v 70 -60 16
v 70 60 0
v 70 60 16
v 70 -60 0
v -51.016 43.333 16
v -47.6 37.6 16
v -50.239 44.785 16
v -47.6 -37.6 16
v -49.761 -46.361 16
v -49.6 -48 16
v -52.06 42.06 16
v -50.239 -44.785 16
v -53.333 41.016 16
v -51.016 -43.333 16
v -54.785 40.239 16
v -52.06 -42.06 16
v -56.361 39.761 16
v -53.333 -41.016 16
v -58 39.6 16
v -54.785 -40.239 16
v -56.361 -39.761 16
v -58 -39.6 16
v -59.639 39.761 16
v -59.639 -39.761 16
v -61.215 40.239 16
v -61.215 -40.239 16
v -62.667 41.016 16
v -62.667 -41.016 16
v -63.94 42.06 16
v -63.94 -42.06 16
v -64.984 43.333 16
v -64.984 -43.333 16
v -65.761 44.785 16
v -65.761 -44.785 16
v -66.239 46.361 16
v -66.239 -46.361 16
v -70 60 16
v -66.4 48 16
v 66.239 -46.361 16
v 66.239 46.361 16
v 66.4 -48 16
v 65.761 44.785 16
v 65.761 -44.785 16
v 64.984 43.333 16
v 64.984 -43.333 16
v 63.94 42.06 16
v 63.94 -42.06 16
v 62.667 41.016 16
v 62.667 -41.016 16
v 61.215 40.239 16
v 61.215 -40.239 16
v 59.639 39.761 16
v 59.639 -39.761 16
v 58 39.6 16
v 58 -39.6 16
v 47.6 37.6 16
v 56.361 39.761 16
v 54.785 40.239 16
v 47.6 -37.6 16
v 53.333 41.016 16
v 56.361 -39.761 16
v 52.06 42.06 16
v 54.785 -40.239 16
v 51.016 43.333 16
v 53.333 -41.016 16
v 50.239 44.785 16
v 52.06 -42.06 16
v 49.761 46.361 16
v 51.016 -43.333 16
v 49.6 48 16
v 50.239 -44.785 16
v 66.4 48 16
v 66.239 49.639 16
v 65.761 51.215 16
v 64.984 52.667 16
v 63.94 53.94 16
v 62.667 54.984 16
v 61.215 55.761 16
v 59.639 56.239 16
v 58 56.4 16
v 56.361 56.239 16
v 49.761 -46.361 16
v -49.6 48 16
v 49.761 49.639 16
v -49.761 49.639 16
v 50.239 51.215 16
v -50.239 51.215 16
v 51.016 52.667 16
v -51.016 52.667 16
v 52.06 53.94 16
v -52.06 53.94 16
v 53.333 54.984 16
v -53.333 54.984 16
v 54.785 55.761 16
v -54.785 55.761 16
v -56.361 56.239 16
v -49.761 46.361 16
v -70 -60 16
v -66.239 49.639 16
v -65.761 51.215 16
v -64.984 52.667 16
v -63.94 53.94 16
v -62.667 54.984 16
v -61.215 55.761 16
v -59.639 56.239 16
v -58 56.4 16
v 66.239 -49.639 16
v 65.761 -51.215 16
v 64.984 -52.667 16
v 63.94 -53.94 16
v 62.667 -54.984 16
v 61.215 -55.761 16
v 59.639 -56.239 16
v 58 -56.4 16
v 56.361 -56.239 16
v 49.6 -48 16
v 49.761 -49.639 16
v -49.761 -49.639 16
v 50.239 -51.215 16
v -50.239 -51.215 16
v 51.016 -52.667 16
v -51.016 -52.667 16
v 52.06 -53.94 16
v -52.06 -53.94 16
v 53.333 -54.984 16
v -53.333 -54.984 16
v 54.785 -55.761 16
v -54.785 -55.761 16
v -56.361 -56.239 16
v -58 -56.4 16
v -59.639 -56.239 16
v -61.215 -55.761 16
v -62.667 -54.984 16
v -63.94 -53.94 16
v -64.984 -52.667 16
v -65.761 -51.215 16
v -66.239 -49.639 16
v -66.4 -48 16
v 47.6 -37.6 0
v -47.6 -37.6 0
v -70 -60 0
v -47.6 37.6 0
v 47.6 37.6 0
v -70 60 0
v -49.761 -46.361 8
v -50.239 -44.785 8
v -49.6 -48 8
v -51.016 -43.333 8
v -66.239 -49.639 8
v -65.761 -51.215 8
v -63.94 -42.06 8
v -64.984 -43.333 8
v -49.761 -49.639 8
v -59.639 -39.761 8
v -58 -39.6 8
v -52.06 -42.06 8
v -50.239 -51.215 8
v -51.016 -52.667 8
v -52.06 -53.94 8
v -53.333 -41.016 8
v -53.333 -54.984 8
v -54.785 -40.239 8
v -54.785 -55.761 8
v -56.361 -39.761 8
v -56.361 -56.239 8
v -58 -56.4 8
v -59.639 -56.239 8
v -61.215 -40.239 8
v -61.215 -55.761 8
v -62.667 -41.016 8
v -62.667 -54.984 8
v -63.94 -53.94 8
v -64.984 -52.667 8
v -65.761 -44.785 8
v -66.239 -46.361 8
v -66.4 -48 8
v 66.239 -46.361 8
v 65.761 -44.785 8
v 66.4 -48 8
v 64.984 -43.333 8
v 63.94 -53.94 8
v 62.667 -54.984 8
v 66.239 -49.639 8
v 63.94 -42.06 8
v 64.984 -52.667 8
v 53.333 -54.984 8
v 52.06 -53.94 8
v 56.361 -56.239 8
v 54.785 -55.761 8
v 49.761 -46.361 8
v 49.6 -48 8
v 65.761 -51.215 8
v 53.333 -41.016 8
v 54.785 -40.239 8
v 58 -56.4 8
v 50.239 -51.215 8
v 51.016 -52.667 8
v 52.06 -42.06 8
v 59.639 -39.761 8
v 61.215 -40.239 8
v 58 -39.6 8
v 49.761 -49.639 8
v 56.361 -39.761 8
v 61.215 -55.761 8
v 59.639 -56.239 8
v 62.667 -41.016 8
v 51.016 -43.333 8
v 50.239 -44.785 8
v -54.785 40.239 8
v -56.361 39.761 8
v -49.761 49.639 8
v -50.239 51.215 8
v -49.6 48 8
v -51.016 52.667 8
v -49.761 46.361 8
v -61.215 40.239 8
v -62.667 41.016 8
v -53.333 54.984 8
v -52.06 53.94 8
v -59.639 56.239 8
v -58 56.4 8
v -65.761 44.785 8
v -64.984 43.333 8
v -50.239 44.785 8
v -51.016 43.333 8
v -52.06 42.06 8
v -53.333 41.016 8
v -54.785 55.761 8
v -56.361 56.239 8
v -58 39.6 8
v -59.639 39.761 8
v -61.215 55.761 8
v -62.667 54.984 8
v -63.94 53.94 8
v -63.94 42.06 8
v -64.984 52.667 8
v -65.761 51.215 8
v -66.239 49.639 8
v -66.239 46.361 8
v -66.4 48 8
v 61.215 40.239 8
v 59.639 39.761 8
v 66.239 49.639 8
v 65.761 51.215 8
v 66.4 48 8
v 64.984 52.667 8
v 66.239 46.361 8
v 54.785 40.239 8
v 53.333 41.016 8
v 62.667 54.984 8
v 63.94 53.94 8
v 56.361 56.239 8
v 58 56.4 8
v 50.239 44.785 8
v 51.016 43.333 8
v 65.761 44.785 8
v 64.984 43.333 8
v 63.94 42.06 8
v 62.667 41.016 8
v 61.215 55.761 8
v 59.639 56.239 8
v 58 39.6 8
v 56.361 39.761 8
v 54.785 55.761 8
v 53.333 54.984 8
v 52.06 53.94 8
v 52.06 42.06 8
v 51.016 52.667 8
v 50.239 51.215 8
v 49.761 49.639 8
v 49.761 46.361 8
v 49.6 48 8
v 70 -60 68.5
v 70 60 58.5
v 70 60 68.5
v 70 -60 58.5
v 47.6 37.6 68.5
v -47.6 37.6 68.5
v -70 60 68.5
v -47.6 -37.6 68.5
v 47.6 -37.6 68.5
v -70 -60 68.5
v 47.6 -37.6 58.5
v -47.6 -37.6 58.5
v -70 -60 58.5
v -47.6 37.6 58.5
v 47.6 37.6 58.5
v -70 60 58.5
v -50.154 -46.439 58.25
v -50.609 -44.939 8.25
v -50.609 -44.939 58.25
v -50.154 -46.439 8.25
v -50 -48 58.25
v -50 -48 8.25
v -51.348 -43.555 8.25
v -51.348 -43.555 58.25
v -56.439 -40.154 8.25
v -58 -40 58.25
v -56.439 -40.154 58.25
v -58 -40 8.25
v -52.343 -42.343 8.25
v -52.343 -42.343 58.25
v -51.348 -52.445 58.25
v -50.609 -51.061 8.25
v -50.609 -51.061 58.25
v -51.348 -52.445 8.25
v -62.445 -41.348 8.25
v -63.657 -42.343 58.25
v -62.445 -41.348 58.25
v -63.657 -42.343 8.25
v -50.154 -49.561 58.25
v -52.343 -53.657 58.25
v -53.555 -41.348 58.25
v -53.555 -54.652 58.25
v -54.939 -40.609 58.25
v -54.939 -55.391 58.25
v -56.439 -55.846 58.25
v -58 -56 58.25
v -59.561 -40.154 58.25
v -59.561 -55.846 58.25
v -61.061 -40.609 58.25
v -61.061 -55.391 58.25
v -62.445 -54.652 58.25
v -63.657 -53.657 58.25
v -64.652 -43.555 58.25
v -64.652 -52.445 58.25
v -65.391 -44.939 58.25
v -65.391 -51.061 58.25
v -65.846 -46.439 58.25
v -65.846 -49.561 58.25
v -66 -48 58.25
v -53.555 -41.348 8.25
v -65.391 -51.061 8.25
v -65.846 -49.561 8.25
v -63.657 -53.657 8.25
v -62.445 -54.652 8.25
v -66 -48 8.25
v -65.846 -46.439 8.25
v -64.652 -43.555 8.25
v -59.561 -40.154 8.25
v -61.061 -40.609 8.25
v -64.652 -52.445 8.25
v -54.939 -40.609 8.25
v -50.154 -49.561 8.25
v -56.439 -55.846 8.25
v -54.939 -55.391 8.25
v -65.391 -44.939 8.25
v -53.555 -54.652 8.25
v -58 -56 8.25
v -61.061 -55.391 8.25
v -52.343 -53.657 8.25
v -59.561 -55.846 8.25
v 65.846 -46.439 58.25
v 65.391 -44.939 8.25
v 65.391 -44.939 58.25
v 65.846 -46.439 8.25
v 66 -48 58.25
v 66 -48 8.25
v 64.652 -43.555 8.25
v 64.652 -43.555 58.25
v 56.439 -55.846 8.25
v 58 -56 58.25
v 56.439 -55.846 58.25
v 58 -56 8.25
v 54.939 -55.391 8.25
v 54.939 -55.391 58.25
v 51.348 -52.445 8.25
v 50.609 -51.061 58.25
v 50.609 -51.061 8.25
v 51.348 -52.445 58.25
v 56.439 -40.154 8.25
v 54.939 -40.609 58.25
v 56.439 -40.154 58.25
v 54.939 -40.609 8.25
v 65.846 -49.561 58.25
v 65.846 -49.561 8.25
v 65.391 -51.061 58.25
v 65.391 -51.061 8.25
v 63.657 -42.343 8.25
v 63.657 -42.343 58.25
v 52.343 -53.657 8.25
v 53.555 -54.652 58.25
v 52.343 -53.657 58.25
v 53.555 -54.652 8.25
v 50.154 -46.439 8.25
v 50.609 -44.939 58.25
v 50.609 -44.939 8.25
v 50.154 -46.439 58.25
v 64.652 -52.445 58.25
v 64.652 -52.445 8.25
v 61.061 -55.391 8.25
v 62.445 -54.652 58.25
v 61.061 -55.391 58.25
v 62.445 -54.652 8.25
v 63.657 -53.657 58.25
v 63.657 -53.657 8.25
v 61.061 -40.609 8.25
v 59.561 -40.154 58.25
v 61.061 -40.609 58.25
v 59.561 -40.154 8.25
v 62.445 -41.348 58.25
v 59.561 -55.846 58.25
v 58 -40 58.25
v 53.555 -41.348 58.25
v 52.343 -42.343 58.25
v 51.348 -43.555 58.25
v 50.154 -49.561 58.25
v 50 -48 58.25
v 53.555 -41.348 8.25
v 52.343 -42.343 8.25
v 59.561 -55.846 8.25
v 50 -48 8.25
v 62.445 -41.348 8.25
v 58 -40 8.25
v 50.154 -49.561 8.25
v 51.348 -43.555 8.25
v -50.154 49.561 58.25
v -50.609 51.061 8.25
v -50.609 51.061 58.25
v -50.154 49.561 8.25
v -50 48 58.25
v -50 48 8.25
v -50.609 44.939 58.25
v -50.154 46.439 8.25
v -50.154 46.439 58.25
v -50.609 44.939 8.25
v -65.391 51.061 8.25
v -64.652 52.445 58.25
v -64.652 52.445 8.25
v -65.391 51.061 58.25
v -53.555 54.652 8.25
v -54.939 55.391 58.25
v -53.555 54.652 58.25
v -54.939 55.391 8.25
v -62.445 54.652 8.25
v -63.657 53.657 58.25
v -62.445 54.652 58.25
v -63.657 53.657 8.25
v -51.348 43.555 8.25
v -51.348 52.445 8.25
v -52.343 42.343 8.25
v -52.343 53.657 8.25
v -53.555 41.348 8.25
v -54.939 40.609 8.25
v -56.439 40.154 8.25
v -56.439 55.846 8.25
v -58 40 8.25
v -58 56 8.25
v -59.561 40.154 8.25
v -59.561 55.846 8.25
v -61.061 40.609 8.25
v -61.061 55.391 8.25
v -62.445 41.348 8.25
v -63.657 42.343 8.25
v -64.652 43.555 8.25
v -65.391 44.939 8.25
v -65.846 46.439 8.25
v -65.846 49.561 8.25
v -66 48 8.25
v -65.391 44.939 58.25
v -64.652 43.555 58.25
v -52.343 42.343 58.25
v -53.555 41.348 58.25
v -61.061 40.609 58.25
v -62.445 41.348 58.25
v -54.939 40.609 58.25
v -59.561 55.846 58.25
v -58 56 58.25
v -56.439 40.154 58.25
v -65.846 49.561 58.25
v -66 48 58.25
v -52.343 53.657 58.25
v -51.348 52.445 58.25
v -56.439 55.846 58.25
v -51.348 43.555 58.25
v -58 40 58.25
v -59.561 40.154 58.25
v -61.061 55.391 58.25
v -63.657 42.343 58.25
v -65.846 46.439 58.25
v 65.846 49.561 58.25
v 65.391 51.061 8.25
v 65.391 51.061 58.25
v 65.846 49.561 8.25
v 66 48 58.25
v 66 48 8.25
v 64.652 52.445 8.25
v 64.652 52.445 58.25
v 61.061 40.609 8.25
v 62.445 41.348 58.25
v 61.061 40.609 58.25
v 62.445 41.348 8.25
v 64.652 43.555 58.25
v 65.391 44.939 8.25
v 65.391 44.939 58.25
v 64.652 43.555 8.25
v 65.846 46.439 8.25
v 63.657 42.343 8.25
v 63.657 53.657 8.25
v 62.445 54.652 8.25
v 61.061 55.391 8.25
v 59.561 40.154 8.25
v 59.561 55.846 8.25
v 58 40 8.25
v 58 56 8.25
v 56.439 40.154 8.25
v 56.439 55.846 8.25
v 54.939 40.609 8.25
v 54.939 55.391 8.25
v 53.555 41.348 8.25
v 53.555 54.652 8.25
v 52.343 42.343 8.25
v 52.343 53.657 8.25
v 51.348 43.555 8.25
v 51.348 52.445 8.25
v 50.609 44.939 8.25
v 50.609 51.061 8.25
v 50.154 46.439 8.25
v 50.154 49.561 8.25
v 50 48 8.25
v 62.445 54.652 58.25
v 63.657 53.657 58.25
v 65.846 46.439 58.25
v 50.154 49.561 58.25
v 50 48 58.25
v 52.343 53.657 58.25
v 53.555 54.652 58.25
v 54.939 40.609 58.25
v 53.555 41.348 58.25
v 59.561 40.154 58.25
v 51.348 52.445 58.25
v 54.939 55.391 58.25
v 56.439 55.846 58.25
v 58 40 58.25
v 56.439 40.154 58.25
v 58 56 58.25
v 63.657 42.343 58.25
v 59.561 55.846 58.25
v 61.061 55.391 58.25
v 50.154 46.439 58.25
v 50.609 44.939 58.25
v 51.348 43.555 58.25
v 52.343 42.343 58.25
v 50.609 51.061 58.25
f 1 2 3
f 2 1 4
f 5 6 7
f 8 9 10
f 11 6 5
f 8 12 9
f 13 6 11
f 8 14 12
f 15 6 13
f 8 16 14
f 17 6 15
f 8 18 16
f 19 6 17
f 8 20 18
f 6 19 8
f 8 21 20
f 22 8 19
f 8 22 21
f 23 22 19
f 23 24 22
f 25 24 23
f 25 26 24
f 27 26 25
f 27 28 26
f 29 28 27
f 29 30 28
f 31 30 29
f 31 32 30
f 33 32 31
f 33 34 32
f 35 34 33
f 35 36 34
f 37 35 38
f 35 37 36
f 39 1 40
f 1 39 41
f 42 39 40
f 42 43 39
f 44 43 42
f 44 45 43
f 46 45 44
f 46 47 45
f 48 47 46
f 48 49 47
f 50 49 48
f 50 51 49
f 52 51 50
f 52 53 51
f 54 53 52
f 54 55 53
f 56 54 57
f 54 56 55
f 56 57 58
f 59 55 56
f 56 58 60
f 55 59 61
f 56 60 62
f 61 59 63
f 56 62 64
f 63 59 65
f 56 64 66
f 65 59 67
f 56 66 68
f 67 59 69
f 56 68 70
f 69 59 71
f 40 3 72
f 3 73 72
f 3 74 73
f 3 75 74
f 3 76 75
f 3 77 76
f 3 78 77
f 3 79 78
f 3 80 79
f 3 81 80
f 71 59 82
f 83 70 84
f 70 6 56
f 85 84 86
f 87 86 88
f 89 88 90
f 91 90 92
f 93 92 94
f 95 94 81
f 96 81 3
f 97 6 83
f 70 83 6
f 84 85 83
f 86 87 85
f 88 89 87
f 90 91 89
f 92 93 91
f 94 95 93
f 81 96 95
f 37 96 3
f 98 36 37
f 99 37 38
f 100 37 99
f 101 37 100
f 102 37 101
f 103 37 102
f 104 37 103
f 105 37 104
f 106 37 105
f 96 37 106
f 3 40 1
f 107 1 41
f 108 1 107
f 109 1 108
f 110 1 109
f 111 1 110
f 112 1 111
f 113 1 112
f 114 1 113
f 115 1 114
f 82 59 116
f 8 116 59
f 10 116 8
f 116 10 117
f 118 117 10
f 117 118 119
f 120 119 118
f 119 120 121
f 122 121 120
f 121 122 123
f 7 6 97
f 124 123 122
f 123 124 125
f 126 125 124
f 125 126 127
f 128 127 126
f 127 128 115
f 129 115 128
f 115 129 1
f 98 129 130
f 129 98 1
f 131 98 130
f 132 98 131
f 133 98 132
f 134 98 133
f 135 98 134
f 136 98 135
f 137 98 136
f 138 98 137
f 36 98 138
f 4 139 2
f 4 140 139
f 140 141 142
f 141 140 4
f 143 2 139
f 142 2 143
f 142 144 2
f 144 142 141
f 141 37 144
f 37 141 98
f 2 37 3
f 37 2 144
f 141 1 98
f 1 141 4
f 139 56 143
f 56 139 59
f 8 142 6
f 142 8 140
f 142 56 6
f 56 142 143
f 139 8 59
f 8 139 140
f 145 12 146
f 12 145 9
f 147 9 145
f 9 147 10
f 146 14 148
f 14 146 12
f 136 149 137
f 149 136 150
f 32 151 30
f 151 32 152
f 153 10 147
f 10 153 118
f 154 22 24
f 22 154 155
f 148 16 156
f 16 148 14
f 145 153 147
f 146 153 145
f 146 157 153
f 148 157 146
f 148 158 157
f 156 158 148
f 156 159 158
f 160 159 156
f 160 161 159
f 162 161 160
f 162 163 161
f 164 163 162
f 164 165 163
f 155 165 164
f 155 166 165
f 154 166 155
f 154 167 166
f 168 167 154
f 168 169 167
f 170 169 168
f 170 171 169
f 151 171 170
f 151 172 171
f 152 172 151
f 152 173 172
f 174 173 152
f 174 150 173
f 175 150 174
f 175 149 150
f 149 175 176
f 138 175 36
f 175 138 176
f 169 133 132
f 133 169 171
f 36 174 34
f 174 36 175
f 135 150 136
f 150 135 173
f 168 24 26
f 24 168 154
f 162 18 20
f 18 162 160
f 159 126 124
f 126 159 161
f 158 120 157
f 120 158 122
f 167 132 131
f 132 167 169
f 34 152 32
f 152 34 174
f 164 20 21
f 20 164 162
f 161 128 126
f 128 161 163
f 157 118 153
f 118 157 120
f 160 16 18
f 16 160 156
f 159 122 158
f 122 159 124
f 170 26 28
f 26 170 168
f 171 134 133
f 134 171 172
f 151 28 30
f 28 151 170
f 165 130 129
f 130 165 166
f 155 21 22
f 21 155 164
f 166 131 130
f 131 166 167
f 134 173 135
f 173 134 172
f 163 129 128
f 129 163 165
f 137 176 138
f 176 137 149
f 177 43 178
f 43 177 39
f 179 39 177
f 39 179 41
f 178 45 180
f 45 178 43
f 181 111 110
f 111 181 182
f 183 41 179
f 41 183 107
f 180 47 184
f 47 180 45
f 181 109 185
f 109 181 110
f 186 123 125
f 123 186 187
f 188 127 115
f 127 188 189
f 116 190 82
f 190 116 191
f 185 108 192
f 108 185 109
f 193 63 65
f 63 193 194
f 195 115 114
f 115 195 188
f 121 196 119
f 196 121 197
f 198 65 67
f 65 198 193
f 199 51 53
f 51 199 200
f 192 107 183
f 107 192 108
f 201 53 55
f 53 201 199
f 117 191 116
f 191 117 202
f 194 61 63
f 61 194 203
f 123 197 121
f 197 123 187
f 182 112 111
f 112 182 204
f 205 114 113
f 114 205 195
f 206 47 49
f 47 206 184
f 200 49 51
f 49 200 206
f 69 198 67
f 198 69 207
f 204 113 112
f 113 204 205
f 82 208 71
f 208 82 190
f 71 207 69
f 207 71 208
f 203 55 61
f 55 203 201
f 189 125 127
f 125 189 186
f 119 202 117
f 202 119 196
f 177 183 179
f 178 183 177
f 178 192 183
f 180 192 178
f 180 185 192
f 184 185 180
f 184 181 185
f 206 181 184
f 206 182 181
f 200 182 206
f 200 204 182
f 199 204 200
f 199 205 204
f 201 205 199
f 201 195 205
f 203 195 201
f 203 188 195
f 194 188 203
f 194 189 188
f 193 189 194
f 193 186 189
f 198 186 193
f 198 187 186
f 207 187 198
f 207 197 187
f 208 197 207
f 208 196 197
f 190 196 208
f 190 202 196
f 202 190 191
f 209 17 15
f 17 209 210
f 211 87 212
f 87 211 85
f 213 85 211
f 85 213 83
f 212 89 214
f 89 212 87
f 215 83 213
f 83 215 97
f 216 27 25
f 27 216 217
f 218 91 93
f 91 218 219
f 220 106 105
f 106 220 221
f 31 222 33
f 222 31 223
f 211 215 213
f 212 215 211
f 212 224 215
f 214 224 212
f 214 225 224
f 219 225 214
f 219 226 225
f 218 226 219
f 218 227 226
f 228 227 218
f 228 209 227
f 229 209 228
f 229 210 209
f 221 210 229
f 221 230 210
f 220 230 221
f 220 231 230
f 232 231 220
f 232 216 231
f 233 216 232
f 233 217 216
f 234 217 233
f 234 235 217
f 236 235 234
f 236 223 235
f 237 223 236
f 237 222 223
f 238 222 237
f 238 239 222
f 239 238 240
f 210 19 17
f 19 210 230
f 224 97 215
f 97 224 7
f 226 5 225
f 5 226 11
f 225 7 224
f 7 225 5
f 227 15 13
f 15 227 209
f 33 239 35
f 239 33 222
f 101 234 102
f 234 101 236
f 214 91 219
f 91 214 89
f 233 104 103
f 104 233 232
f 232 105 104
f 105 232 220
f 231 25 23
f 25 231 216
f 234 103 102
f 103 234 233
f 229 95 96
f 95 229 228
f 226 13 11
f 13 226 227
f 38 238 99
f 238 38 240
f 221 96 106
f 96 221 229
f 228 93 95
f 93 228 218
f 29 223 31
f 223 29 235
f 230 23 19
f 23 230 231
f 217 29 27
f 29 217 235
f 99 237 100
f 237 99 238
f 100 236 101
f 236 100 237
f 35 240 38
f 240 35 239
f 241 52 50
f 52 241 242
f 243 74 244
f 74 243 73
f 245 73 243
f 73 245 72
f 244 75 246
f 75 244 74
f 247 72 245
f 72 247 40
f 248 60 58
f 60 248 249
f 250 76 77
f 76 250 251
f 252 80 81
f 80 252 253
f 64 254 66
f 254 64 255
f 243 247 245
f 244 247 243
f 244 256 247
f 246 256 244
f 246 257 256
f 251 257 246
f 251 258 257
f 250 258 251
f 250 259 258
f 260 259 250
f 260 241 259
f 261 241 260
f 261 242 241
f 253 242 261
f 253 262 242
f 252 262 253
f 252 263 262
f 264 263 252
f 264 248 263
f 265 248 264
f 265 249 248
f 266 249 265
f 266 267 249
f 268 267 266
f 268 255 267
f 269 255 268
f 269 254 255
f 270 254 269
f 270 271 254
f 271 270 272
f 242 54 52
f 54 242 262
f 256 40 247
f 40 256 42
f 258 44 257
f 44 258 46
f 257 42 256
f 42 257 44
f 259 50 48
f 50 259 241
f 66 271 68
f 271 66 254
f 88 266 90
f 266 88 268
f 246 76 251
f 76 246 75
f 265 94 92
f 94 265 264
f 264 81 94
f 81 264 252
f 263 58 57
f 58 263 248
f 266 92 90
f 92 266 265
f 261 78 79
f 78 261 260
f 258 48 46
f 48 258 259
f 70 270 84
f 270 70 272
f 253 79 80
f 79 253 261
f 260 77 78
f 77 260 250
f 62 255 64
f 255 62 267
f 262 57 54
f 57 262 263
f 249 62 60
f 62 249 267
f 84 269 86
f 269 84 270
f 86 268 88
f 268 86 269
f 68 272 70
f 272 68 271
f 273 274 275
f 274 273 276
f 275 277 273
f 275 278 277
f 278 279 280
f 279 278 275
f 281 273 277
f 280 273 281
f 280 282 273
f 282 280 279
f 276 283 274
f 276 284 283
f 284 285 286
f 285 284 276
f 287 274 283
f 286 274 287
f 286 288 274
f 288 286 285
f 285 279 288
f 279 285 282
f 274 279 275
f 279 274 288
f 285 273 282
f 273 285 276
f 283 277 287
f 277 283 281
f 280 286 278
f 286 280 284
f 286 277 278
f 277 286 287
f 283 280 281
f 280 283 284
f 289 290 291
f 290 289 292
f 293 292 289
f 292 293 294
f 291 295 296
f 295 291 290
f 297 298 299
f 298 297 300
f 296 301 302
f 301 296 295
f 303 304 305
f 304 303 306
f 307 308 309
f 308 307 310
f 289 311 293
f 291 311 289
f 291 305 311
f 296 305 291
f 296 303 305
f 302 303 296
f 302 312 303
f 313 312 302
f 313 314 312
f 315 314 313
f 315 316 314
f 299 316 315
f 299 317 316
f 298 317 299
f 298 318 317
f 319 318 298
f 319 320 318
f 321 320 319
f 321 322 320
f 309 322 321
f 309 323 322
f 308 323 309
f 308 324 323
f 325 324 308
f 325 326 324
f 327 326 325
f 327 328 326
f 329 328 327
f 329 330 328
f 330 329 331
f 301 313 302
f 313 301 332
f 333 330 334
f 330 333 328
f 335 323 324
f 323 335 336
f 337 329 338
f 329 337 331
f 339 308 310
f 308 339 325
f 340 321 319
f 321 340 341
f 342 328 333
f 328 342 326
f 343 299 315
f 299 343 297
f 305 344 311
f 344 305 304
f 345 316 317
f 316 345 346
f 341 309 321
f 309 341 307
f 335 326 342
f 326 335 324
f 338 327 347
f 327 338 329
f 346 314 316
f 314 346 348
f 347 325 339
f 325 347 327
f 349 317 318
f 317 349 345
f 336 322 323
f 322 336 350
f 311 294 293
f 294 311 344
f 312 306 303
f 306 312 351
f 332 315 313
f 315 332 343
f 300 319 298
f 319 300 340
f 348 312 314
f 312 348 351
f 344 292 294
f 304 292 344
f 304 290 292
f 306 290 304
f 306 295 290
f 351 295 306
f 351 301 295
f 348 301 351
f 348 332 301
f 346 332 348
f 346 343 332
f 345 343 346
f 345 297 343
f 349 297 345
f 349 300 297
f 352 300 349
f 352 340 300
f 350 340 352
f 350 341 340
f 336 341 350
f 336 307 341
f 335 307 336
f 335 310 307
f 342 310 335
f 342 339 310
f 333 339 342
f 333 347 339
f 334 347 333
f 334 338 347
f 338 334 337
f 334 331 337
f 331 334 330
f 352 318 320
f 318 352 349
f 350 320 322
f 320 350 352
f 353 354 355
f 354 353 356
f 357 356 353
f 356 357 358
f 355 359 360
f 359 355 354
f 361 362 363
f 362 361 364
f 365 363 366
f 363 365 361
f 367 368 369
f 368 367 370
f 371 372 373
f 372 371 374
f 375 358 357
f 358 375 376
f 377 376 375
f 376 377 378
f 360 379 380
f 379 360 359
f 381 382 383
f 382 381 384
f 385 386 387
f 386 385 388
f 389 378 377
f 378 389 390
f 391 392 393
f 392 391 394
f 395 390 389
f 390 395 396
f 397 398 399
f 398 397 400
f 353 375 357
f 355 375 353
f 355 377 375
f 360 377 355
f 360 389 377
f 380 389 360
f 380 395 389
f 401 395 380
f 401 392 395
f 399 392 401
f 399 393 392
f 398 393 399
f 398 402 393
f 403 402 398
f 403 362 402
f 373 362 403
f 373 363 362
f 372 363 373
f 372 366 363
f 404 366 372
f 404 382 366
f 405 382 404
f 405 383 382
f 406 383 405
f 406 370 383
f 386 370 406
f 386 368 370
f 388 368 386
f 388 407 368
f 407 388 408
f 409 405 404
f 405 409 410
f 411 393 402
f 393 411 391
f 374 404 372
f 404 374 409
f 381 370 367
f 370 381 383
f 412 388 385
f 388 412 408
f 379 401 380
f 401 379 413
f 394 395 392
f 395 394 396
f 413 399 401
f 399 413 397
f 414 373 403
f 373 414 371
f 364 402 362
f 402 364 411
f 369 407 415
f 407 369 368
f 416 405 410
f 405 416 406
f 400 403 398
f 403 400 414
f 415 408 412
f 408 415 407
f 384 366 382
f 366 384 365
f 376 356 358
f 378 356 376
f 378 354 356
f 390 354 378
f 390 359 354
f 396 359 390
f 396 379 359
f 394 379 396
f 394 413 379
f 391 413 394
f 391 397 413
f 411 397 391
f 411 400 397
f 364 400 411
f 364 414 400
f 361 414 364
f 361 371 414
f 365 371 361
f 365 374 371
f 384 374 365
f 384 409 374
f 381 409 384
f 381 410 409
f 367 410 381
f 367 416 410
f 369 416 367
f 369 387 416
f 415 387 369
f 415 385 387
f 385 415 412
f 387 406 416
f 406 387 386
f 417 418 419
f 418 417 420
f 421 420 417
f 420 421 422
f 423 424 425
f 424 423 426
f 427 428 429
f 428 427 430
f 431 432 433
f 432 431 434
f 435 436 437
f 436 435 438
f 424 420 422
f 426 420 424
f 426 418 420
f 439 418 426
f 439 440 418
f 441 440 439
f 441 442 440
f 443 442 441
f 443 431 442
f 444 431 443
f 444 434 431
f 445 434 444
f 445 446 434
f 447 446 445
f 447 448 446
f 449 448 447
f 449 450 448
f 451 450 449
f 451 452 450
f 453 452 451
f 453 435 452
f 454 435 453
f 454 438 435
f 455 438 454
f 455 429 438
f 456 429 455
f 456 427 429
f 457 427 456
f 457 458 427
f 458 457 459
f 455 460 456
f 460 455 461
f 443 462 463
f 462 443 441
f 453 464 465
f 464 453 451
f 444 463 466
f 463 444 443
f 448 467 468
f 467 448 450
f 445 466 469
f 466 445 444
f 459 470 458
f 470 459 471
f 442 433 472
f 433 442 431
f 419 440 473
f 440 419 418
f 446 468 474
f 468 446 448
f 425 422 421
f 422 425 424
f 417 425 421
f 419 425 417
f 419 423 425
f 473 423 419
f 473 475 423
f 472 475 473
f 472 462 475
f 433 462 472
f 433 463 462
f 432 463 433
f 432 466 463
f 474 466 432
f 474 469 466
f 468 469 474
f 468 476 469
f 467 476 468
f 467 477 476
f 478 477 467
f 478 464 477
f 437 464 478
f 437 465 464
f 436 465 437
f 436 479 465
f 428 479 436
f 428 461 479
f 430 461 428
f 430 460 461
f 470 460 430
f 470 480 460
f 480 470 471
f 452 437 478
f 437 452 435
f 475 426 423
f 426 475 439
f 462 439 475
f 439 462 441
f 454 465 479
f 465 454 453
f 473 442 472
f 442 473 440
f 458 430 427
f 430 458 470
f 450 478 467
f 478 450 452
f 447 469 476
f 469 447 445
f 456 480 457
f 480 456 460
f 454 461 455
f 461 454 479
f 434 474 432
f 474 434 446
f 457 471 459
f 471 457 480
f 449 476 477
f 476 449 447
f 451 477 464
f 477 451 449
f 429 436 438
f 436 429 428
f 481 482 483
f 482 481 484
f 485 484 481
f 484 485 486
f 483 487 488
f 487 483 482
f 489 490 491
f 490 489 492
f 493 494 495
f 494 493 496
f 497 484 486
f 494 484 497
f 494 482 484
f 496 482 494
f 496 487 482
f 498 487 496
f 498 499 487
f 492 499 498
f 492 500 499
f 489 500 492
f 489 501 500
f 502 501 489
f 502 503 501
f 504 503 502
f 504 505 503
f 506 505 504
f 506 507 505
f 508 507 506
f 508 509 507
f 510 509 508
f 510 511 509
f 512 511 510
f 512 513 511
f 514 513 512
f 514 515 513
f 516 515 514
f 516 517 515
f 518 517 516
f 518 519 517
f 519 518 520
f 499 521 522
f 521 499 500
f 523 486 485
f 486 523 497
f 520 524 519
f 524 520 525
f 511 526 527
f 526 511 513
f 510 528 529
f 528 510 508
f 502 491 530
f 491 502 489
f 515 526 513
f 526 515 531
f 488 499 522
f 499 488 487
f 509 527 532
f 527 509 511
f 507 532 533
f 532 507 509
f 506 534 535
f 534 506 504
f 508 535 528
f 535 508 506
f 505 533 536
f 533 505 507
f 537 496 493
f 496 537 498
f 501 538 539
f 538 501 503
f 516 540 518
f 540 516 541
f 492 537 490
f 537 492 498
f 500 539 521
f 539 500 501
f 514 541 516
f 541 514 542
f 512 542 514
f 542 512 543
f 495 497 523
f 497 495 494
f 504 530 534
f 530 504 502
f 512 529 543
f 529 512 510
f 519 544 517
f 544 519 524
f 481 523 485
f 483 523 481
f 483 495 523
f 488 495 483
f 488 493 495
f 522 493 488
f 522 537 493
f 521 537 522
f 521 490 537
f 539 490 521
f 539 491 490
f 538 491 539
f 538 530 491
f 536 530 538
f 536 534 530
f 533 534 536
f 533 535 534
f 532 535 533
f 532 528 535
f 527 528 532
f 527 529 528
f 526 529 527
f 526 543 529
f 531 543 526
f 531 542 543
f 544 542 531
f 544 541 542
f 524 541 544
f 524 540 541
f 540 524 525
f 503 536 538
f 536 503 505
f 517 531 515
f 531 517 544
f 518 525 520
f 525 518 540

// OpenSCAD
$fn = 32;

// ------------------------------------------------------------------------
// Frame cube: base 140 x 120 mm, posts 50 mm tall
// Every part is its own module, assembly() places every instance.
// ------------------------------------------------------------------------

// --- part 1 ---
module base_frame() {
  difference() {
    translate([-70, -60, 0]) cube([140, 120, 16]);
    translate([-47.6, -37.6, -1]) cube([95.2, 75.2, 18]);
    translate([-58, -48, 8]) cylinder(h = 9, d = 16.8);
    translate([58, -48, 8]) cylinder(h = 9, d = 16.8);
    translate([-58, 48, 8]) cylinder(h = 9, d = 16.8);
    translate([58, 48, 8]) cylinder(h = 9, d = 16.8);
  }
}

// --- part 2 ---
module corner_post() {
  cylinder(h = 50, d = 16);
}

// --- part 3 ---
module top_frame() {
  difference() {
    translate([-70, -60, 0]) cube([140, 120, 10]);
    translate([-47.6, -37.6, -1]) cube([95.2, 75.2, 12]);
  }
}

// --- assembly ---
module assembly() {
  color([0.80, 0.24, 0.20]) translate([0, 0, 0]) rotate([0, 0, 0]) base_frame();
  color([0.20, 0.45, 0.75]) translate([-58, -48, 8.25]) rotate([0, 0, 0]) corner_post();
  color([0.25, 0.62, 0.32]) translate([58, -48, 8.25]) rotate([0, 0, 0]) corner_post();
  color([0.92, 0.70, 0.18]) translate([-58, 48, 8.25]) rotate([0, 0, 0]) corner_post();
  color([0.58, 0.35, 0.70]) translate([58, 48, 8.25]) rotate([0, 0, 0]) corner_post();
  color([0.16, 0.66, 0.66]) translate([0, 0, 58.5]) rotate([0, 0, 0]) top_frame();
}

assembly();
